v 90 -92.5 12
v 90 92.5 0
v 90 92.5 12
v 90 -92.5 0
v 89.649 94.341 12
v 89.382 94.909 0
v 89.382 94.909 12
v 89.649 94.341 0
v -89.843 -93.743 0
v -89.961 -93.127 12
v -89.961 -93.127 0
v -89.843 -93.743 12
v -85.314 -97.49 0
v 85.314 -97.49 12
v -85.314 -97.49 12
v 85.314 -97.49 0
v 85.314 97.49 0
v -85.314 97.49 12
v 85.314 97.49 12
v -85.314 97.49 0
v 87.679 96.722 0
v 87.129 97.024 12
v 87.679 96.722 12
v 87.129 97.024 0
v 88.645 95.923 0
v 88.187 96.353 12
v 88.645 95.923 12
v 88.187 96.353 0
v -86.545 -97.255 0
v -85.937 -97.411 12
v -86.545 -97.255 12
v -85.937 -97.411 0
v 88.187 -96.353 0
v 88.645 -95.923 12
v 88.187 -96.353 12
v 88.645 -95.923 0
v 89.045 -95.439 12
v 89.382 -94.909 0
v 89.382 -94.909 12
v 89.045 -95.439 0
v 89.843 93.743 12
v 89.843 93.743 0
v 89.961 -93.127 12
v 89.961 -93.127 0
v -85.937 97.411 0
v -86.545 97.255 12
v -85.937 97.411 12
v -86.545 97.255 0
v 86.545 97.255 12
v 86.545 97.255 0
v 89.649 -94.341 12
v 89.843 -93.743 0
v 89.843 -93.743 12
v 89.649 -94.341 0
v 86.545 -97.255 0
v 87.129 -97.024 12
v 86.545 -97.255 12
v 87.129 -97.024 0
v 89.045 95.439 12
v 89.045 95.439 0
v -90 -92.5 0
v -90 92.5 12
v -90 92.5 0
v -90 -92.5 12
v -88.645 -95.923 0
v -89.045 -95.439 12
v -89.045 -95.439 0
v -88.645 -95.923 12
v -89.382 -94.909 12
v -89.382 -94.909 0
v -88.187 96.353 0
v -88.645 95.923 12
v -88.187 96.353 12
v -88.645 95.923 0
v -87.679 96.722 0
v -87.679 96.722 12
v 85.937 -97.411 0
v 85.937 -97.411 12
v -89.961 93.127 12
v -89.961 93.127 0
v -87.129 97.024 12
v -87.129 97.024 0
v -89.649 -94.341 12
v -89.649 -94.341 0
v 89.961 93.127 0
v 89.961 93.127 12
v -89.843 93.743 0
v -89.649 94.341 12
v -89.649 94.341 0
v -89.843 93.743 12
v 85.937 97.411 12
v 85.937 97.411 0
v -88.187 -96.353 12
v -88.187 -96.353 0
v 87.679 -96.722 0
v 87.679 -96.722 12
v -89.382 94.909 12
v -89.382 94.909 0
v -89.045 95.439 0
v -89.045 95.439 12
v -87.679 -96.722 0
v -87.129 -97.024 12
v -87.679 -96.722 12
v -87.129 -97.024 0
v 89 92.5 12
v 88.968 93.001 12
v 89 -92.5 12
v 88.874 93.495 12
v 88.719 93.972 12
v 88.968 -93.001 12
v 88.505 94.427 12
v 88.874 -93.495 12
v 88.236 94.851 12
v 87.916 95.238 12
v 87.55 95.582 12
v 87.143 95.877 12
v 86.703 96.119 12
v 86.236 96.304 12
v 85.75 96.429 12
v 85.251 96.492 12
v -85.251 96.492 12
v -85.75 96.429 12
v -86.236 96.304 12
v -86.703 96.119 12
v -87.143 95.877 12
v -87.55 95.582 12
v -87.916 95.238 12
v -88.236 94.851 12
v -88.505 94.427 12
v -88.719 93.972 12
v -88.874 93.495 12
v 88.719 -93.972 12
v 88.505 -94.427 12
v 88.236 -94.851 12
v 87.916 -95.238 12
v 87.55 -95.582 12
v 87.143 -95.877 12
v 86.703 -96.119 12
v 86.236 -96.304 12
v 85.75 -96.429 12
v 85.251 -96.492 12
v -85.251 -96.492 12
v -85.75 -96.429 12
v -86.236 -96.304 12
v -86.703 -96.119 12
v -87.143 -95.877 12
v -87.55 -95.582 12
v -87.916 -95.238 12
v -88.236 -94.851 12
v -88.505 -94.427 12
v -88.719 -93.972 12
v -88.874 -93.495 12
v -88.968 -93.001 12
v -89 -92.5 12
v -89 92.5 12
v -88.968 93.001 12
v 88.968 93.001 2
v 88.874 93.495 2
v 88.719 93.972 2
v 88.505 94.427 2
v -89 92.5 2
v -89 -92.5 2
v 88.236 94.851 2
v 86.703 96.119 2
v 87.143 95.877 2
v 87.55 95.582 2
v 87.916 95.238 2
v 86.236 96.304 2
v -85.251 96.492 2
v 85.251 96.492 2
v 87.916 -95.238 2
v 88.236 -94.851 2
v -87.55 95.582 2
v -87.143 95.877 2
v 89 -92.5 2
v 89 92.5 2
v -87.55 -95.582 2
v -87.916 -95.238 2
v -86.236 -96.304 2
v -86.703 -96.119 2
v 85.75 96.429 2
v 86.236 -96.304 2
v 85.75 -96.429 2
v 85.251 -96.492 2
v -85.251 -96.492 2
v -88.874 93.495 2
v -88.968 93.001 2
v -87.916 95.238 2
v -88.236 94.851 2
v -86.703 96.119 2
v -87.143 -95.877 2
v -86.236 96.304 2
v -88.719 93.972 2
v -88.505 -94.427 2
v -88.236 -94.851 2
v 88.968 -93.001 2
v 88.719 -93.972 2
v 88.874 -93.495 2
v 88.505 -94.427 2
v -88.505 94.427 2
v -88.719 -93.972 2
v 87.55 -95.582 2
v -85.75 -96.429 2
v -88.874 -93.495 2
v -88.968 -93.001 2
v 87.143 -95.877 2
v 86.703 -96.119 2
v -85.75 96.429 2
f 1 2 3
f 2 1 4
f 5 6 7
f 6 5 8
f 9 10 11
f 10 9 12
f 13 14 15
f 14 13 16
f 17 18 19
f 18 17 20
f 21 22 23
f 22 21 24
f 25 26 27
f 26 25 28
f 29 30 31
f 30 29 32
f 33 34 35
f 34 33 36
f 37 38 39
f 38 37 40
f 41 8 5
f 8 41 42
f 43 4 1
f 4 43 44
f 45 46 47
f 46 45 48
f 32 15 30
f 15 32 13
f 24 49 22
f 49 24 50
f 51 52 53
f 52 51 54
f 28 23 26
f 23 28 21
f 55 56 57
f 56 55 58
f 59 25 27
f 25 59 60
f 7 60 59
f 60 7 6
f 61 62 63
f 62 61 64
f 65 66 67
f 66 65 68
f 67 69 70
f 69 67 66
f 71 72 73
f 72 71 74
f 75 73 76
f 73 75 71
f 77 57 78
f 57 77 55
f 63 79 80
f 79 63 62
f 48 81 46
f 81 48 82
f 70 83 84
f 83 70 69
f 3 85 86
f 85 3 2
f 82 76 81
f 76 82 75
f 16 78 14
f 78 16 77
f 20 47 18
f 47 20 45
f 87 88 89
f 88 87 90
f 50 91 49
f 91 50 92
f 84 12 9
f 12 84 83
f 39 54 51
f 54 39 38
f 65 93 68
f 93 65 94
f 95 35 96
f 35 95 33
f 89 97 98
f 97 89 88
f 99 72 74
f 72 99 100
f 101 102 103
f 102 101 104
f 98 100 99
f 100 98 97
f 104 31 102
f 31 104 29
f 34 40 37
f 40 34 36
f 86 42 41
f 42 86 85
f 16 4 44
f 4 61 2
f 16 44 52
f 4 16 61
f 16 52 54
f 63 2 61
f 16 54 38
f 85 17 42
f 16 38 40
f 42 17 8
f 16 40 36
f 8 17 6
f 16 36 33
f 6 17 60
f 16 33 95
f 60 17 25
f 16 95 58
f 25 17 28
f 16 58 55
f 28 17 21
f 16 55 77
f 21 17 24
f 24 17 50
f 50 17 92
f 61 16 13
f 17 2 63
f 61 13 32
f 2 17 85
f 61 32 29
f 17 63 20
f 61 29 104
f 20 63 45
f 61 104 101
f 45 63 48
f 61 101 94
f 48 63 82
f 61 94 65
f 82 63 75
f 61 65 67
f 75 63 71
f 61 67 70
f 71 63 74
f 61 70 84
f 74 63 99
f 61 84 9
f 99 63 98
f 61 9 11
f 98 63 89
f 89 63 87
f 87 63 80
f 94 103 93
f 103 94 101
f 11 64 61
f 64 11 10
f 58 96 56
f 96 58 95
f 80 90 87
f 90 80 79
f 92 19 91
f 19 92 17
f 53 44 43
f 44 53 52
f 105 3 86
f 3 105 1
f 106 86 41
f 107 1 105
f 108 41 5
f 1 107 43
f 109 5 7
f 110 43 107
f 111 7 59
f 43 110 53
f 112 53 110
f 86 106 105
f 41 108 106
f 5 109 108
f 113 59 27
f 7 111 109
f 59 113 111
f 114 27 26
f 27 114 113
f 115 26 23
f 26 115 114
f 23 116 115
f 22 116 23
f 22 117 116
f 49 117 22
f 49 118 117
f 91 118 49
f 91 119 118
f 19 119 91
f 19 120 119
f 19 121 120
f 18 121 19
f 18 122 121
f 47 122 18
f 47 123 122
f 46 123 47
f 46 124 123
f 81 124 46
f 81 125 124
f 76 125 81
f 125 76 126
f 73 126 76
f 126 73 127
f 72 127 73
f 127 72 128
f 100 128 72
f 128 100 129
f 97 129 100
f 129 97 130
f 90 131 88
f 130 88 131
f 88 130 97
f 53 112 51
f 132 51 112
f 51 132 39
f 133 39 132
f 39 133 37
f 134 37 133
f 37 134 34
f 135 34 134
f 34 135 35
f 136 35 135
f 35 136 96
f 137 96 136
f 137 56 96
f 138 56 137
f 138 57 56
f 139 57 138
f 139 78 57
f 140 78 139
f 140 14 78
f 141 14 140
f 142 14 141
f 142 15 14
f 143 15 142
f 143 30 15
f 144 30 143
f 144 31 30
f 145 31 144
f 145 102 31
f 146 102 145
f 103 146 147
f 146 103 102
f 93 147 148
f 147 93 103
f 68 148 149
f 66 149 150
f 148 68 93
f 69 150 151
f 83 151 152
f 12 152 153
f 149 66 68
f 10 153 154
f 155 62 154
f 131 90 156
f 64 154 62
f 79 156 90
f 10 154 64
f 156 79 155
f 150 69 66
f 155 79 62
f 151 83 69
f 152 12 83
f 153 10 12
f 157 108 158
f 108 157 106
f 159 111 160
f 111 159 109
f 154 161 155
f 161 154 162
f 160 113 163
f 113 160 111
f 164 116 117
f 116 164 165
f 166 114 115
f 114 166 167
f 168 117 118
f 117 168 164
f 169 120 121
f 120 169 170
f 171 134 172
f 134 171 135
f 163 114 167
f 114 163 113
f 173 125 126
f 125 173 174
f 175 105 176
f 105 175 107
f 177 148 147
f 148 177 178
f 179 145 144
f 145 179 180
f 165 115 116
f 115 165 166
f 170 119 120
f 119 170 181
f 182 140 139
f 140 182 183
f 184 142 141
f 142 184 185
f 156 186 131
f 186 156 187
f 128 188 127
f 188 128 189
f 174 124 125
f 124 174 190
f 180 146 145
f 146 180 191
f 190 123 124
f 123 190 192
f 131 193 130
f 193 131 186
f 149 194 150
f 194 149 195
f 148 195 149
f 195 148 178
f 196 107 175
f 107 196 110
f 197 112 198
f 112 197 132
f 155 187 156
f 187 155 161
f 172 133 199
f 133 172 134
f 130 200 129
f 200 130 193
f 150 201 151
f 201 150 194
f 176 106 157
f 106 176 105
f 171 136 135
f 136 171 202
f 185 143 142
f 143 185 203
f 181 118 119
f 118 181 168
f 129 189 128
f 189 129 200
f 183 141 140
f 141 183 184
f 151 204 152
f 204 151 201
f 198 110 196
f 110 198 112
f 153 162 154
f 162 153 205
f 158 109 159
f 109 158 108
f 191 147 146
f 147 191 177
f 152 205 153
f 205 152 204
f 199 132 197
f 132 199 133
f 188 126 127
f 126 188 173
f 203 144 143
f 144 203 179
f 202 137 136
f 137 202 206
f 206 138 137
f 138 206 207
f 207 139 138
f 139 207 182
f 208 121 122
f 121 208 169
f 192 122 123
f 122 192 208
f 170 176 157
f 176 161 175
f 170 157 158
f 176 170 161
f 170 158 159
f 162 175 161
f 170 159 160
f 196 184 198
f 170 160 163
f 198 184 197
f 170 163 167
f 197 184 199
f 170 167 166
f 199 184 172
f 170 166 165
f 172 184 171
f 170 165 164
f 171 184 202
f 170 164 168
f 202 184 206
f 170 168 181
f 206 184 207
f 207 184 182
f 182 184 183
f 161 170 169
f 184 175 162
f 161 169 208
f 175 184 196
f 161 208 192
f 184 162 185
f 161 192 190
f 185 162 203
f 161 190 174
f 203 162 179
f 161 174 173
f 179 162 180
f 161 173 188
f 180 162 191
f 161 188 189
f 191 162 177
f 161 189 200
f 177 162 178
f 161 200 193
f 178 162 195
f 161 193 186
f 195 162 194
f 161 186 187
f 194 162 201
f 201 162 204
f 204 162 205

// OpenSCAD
$fn = 50;


difference() {
	union() {
		hull() {
			translate(v = [-85.0000000000, 92.5000000000, 0]) {
				cylinder(h = 12, r = 5);
			}
			translate(v = [85.0000000000, 92.5000000000, 0]) {
				cylinder(h = 12, r = 5);
			}
			translate(v = [-85.0000000000, -92.5000000000, 0]) {
				cylinder(h = 12, r = 5);
			}
			translate(v = [85.0000000000, -92.5000000000, 0]) {
				cylinder(h = 12, r = 5);
			}
		}
	}
	union() {
		translate(v = [0, 0, 2]) {
			hull() {
				translate(v = [-85.0000000000, 92.5000000000, 0]) {
					cylinder(h = 10, r = 4);
				}
				translate(v = [85.0000000000, 92.5000000000, 0]) {
					cylinder(h = 10, r = 4);
				}
				translate(v = [-85.0000000000, -92.5000000000, 0]) {
					cylinder(h = 10, r = 4);
				}
				translate(v = [85.0000000000, -92.5000000000, 0]) {
					cylinder(h = 10, r = 4);
				}
			}
		}
	}
}
